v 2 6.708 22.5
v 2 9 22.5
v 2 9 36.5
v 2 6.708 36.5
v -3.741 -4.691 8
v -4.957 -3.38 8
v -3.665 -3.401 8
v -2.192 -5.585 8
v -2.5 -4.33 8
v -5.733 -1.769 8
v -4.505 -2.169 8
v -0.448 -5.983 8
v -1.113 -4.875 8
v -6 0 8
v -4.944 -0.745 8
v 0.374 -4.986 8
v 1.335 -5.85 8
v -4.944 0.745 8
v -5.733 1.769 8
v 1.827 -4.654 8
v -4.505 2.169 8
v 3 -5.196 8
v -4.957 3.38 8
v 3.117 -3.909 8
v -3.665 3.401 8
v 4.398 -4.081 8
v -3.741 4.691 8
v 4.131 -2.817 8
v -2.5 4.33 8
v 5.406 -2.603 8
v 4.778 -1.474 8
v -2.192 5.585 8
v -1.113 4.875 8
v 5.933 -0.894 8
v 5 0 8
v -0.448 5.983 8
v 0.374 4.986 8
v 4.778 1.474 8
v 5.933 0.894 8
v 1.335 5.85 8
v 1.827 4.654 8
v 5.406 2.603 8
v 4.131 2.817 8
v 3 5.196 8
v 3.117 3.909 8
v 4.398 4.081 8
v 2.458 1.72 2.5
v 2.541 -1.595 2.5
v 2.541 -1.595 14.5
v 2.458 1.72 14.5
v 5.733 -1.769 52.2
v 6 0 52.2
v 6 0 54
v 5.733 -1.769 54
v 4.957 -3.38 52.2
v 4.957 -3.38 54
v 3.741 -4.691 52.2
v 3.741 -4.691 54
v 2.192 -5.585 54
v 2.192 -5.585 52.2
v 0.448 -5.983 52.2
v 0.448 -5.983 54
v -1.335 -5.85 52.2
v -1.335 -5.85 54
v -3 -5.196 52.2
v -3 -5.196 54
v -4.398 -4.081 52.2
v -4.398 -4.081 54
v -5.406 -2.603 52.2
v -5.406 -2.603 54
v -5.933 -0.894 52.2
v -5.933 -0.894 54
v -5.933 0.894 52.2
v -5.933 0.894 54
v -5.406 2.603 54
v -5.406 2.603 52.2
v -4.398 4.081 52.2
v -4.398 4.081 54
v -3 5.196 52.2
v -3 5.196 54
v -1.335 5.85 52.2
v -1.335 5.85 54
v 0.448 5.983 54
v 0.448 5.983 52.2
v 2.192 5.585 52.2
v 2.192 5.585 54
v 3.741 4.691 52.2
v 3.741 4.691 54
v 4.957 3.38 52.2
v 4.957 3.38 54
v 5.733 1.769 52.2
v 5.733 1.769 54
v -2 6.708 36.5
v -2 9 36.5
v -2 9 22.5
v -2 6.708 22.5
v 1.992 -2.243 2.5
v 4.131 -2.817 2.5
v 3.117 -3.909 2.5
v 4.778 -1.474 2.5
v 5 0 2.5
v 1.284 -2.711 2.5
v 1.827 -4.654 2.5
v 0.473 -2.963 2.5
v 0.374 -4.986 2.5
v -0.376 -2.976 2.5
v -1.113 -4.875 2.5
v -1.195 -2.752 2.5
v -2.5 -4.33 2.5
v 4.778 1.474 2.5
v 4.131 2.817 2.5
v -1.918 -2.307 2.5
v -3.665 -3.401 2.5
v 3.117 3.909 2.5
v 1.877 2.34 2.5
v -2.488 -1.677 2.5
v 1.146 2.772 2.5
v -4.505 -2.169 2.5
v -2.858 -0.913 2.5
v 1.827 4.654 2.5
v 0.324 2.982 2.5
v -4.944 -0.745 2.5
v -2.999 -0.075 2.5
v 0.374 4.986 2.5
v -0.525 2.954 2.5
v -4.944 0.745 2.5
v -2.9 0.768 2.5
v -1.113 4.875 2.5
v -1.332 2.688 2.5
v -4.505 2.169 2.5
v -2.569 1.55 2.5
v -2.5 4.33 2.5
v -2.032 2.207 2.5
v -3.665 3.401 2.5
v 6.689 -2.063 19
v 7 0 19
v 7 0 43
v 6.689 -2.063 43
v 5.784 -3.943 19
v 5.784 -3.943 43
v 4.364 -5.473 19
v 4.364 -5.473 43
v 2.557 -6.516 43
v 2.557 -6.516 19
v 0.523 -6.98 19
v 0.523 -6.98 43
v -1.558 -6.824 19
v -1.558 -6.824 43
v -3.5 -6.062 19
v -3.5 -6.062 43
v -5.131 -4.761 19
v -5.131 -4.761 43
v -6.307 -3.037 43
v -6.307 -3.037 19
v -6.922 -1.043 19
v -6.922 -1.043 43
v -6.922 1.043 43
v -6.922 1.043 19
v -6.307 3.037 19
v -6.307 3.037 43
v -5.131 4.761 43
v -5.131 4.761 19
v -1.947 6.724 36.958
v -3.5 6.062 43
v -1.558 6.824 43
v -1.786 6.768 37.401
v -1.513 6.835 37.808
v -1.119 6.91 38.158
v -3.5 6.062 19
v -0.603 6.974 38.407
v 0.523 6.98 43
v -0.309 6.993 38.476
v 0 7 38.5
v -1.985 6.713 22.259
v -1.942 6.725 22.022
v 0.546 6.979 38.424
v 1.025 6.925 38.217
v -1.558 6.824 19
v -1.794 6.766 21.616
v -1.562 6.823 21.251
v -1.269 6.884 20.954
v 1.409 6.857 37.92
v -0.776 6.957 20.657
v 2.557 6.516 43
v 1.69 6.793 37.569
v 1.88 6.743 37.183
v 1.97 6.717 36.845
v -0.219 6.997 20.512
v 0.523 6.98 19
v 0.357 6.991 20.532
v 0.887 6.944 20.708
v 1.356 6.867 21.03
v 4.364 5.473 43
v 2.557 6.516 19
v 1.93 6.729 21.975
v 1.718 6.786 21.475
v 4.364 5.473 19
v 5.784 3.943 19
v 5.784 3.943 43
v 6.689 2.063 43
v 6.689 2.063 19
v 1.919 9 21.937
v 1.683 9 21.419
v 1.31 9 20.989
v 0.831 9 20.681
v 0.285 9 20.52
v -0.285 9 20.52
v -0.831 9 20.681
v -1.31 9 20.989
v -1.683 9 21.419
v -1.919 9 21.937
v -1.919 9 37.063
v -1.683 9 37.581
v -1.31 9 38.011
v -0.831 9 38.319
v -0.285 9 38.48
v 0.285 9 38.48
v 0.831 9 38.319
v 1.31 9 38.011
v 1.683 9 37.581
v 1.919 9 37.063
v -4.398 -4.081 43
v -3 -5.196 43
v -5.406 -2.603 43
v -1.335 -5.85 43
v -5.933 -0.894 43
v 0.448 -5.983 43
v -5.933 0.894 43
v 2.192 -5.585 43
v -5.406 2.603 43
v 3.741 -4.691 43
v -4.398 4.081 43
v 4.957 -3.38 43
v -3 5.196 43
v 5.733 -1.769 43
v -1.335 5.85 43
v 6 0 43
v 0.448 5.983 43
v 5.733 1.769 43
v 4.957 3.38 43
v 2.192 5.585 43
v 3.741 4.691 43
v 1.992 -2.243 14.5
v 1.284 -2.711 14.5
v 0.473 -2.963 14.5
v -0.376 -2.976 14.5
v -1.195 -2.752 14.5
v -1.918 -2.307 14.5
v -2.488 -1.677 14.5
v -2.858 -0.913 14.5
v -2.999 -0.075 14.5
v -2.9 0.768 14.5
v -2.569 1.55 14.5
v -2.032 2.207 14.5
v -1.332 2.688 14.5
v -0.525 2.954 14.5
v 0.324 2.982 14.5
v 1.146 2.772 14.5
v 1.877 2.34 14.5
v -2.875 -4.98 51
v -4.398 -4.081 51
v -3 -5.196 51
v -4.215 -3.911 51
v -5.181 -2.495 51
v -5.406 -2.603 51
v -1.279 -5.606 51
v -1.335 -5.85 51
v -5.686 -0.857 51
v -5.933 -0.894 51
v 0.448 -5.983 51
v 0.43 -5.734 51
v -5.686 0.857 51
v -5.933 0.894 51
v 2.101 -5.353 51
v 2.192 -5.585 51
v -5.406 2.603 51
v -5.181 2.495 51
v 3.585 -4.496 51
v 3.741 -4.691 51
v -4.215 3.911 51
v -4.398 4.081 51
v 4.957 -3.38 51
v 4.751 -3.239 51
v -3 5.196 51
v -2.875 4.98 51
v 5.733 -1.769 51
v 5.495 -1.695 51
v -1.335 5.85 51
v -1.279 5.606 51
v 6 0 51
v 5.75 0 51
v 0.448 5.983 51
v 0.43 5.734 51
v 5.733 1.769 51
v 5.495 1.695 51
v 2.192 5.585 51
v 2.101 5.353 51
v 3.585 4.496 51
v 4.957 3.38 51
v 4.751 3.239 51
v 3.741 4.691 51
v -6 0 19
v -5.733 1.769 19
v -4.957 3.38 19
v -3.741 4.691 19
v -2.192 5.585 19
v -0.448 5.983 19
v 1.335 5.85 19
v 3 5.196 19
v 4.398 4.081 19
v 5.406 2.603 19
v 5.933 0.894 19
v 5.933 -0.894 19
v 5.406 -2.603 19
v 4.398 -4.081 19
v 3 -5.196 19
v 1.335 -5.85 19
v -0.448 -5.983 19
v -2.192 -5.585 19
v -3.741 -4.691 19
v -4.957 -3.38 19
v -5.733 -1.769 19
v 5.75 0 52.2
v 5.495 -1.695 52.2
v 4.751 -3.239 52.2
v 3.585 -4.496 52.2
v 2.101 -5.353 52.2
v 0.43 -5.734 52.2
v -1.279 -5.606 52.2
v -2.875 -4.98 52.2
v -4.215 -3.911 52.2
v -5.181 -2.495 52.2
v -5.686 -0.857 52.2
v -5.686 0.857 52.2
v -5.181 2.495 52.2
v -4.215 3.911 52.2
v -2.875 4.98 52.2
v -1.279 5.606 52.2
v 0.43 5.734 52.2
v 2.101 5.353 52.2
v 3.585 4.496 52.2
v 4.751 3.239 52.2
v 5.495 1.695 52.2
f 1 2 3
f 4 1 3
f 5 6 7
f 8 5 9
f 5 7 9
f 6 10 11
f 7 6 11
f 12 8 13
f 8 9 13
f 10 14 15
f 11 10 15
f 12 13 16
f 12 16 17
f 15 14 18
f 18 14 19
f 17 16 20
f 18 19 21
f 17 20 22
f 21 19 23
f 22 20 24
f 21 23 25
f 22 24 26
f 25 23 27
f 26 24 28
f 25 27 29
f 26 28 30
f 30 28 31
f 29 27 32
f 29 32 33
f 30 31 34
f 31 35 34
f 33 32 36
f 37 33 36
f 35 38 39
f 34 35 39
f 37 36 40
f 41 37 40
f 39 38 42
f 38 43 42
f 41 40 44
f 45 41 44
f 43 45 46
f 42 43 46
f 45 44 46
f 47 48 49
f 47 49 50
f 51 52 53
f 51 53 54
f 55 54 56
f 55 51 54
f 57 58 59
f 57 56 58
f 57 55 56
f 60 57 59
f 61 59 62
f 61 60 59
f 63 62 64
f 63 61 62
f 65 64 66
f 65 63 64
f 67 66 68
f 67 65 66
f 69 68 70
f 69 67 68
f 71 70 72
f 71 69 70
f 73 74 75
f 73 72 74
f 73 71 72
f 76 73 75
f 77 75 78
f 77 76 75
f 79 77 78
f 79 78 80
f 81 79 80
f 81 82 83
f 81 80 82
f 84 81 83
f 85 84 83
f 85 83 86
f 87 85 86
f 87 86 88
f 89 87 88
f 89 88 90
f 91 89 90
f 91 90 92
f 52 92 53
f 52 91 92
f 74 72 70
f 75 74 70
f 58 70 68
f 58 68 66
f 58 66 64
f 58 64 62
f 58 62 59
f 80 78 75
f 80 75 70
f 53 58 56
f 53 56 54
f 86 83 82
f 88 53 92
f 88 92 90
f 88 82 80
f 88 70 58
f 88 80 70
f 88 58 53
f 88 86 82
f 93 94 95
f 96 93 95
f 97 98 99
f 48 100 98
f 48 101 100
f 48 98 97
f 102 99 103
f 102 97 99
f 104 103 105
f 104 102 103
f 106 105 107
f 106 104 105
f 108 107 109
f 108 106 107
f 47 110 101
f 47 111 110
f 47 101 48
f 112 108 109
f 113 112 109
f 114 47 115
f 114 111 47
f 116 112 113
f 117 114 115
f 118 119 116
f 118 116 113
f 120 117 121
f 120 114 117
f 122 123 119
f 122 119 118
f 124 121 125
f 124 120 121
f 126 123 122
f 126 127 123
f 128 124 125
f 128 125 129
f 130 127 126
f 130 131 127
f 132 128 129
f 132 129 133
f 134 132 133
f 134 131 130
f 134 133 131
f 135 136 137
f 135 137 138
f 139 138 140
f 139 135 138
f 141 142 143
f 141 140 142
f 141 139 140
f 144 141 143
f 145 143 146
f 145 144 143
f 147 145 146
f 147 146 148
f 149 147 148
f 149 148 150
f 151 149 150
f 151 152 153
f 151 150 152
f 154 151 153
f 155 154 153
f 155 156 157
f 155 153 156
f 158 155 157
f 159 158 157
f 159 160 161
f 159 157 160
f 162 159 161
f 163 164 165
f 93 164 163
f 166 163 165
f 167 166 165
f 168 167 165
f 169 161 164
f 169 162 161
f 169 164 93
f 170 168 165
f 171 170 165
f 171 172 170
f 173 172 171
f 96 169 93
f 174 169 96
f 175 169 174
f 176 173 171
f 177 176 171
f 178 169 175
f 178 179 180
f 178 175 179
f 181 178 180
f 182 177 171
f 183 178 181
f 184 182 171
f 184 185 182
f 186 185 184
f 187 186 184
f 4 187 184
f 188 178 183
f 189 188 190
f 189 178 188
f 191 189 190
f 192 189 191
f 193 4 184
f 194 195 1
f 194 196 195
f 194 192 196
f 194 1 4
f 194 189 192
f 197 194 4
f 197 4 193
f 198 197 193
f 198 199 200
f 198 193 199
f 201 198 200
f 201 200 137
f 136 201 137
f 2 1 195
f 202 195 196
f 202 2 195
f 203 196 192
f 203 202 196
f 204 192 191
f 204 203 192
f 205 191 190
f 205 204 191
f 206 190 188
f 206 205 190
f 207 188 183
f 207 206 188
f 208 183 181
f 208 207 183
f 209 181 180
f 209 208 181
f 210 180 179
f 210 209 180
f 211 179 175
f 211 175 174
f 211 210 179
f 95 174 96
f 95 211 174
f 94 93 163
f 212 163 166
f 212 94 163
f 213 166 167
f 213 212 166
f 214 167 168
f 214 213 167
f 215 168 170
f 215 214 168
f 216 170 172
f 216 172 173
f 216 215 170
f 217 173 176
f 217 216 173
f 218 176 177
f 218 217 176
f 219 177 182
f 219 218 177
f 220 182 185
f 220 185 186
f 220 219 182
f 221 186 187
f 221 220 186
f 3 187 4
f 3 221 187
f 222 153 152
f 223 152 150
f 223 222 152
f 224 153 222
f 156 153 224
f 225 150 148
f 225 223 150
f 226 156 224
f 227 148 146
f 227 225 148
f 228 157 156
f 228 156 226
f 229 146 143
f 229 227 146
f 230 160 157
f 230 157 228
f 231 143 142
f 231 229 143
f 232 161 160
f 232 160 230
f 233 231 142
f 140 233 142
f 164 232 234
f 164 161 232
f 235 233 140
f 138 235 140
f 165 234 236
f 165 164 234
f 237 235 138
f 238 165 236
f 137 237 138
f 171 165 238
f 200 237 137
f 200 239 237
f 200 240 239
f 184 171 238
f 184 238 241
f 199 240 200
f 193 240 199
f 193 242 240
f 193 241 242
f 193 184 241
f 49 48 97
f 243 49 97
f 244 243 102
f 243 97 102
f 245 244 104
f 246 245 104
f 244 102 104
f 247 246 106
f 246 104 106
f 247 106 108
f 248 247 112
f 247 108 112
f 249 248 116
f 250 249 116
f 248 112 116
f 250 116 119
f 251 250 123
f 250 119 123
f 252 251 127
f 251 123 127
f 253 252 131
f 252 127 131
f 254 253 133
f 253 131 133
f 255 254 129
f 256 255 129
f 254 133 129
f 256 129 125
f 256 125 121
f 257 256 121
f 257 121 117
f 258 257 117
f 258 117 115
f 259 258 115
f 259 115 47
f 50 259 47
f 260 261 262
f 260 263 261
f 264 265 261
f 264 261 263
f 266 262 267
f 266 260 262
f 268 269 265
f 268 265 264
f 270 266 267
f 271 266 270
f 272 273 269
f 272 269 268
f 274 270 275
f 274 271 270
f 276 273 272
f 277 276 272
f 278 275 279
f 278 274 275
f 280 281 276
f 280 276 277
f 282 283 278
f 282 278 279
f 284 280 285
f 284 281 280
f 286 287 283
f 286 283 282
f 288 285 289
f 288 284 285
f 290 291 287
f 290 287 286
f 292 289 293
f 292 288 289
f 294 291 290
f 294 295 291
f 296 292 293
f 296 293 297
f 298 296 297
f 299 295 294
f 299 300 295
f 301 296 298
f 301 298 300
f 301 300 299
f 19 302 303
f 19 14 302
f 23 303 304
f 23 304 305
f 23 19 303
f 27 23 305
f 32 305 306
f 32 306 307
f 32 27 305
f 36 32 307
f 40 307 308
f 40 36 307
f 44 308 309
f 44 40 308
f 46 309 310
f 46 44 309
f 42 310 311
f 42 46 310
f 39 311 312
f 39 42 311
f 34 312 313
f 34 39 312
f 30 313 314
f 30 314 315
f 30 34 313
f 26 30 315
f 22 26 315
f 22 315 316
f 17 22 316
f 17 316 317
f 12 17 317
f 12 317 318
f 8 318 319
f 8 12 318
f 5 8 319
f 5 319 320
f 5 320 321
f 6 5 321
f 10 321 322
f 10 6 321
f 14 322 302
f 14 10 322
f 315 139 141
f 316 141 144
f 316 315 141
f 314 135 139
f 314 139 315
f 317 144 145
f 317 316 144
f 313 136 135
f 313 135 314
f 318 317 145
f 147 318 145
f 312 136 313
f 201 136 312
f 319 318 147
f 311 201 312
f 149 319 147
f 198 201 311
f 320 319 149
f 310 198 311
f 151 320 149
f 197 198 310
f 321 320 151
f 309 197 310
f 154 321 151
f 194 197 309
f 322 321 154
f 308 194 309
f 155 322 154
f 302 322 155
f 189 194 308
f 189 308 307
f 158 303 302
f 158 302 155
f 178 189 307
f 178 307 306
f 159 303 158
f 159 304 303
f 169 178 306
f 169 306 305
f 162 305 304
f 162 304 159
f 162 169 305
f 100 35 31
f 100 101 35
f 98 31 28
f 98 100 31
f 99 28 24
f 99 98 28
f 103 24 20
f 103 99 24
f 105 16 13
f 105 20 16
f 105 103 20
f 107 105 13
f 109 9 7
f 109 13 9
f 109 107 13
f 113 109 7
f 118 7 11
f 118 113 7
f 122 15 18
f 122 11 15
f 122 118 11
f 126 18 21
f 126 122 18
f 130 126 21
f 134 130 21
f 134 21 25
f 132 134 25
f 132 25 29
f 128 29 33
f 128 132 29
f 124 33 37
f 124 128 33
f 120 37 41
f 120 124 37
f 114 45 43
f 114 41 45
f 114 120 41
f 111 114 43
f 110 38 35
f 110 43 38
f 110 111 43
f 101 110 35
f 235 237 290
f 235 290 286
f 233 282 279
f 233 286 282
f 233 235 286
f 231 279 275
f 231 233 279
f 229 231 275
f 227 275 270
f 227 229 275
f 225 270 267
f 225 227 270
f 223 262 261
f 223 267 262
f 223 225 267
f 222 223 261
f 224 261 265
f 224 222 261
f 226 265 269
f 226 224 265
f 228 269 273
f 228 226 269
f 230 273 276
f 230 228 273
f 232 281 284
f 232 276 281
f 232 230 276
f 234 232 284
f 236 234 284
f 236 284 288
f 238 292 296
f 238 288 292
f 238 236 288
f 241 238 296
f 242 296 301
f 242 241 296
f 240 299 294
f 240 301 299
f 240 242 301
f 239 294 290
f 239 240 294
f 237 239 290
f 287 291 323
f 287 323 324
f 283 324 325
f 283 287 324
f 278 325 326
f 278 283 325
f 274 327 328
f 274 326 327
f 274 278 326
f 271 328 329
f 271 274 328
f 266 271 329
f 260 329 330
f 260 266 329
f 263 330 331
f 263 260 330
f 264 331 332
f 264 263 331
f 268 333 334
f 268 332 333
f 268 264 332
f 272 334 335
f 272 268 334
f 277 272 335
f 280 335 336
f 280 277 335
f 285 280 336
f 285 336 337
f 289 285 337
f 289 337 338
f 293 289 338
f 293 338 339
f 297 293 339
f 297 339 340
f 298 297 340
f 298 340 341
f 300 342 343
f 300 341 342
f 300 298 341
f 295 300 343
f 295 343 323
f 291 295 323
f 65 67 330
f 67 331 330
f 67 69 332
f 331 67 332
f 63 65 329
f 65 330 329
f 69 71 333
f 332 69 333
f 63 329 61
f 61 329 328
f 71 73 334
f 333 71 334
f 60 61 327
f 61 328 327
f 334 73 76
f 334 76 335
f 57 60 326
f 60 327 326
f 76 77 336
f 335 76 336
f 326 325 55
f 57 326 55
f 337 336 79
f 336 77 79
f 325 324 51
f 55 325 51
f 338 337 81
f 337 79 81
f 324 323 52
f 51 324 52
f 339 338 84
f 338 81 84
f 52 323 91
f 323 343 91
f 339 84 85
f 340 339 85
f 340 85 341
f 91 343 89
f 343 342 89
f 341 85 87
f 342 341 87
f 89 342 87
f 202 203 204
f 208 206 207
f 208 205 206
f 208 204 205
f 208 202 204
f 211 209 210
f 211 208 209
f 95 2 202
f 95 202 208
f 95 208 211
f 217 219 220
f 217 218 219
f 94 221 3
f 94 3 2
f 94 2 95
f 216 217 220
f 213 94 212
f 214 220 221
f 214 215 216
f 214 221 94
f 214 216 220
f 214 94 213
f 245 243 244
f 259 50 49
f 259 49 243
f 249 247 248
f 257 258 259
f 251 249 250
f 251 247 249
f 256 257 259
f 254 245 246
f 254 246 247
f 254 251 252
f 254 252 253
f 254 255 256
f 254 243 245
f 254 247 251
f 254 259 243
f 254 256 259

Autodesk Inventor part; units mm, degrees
sketch "Sketch1" plane through (0, 0, 0) normal (0, 0, 1) x (1, 0, 0)
  arc A0 (-1.5, -1.3229) -> (-1.5, 1.3229) centre (0, 0) ccw
  line L0 (-1.5, 1.3229) -> (-1.5, -1.3229)
  circle A1 centre (0, 0) radius 5
  dimension "d0" = 4
  dimension "d2" = 10
extrude "Extrusion1" add sketch "Sketch1" along normal blind 8
sketch "Sketch2" plane through (0, 0, 8) normal (0, 0, 1) x (1, 0, 0)
  point P0 (0, 0)
sketch "Sketch3" plane through (0, 0, 8) normal (0, 0, 1) x (1, 0, 0)
  circle A0 centre (0, 0) radius 7
  dimension "d5" = 14
extrude "Extrusion2" add sketch "Sketch3" along normal blind 35
ref_plane "Work Plane1" through (0, 9, 0) normal (0, 1, 0) x (-1, 0, 0)
sketch "Sketch4" plane through (0, 9, 0) normal (0, 1, 0) x (-1, 0, 0)
  line L0 (0, 20.5) -> (0, 20.5)
  line L1 (-2, 22.5) -> (-2, 36.5)
  line L2 (0, 38.5) -> (0, 38.5)
  line L3 (2, 36.5) -> (2, 22.5)
  line L4 (0, -7.7828) -> (0, 46.6971) projected
  line L5 (7, 8) -> (-7, 8) projected
  arc A0 (0, 20.5) -> (2, 22.5) centre (0, 22.5) ccw
  arc A1 (-2, 22.5) -> (0, 20.5) centre (0, 22.5) ccw
  arc A2 (2, 36.5) -> (0, 38.5) centre (0, 36.5) ccw
  arc A3 (0, 38.5) -> (-2, 36.5) centre (0, 36.5) ccw
  line L6 (4.0307, 31) -> (-5.3749, 31) construction
  point P0 (0, 0)
  point P1 (-2, 38.5)
  point P2 (-2, 20.5)
  point P3 (2, 38.5)
  point P4 (0, 38.5)
  point P5 (0, 20.5)
  point P6 (0, 38.5)
  point P7 (0, 20.5)
  point P8 (0, 20.5)
  point P9 (0, 38.5)
  dimension "d9" = 18
  dimension "d10" = 4
  dimension "d11" = 12.5
  dimension "d12" = 2
extrude "Extrusion3" add sketch "Sketch4" against normal up to surface
sketch "Sketch5" plane through (0, 0, 8) normal (0, 0, -1) x (-1, 0, 0)
  circle A0 centre (0, 0) radius 6
  circle A1 centre (0, 0) radius 7
  dimension "d15" = 12
extrude "Extrusion4" cut sketch "Sketch5" against normal blind 11
sketch "Sketch6" plane through (0, 0, 43) normal (0, 0, 1) x (1, 0, 0)
  arc A0 (-1.5, -1.3229) -> (-1.5, 1.3229) centre (0, 0) ccw projected
  circle A1 centre (0, 0) radius 6
  dimension "d18" = 12
extrude "Extrusion5" add sketch "Sketch6" along normal blind 11
ref_plane "Work Plane2" through (0, 0, 11) normal (0, 0, -1) x (-1, 0, 0)
ref_plane "Work Plane3" through (0, 0, 51) normal (0, 0, 1) x (1, 0, 0)
sketch "Sketch8" plane through (0, 0, 51) normal (0, 0, 1) x (1, 0, 0)
  circle A0 centre (0, 0) radius 5.75
  arc A1 (-1.5, -1.3229) -> (-1.5, 1.3229) centre (0, 0) ccw projected
  circle A2 centre (0, 0) radius 6
  dimension "d27" = 11.5
  dimension "d28" = 12
extrude "Extrusion7" cut sketch "Sketch8" along normal blind 1.2
sketch "Sketch9" plane through (0, 0, 0) normal (0, 0, -1) x (-1, 0, 0)
  circle A0 centre (0, 0) radius 5 projected
  line L0 (1.5, -1.3229) -> (1.5, 1.3229) projected
  arc A1 (1.5, 1.3229) -> (1.5, -1.3229) centre (0, 0) ccw projected
extrude "Extrusion8" cut sketch "Sketch9" against normal blind 2.5
sketch "Sketch10" plane through (0, 0, 8) normal (0, 0, -1) x (-1, 0, 0)
  arc A0 (1.5, 1.3229) -> (1.5, -1.3229) centre (0, 0) ccw projected
  line L0 (1.5, -1.3229) -> (1.5, 1.3229) projected
extrude "Extrusion9" cut sketch "Sketch10" against normal blind 2.7
sketch "Sketch11" plane through (0, 0, 8) normal (0, 0, -1) x (-1, 0, 0)
  line L0 (1.5, 1.3229) -> (1.5, -1.3229) projected
  arc A0 (1.5, 1.3229) -> (1.5, -1.3229) centre (0, 0) ccw projected
extrude "Extrusion10" add sketch "Sketch11" along normal up to surface (5.5 mm away)
sketch "Sketch12" plane through (0, 0, 2.5) normal (0, 0, -1) x (-1, 0, 0)
  circle A0 centre (0, 0) radius 1.5 projected
  line L0 (-2.5408, -1.5951) -> (-2.4576, 1.7205) projected
  arc A1 (-2.5408, -1.5951) -> (-2.4576, 1.7205) centre (0, 0) ccw projected
  point P0 (0, 0)
extrude "Extrusion11" cut sketch "Sketch12" against normal blind 12 contours A0 | L0 A1
properties part number "shatft extension"
